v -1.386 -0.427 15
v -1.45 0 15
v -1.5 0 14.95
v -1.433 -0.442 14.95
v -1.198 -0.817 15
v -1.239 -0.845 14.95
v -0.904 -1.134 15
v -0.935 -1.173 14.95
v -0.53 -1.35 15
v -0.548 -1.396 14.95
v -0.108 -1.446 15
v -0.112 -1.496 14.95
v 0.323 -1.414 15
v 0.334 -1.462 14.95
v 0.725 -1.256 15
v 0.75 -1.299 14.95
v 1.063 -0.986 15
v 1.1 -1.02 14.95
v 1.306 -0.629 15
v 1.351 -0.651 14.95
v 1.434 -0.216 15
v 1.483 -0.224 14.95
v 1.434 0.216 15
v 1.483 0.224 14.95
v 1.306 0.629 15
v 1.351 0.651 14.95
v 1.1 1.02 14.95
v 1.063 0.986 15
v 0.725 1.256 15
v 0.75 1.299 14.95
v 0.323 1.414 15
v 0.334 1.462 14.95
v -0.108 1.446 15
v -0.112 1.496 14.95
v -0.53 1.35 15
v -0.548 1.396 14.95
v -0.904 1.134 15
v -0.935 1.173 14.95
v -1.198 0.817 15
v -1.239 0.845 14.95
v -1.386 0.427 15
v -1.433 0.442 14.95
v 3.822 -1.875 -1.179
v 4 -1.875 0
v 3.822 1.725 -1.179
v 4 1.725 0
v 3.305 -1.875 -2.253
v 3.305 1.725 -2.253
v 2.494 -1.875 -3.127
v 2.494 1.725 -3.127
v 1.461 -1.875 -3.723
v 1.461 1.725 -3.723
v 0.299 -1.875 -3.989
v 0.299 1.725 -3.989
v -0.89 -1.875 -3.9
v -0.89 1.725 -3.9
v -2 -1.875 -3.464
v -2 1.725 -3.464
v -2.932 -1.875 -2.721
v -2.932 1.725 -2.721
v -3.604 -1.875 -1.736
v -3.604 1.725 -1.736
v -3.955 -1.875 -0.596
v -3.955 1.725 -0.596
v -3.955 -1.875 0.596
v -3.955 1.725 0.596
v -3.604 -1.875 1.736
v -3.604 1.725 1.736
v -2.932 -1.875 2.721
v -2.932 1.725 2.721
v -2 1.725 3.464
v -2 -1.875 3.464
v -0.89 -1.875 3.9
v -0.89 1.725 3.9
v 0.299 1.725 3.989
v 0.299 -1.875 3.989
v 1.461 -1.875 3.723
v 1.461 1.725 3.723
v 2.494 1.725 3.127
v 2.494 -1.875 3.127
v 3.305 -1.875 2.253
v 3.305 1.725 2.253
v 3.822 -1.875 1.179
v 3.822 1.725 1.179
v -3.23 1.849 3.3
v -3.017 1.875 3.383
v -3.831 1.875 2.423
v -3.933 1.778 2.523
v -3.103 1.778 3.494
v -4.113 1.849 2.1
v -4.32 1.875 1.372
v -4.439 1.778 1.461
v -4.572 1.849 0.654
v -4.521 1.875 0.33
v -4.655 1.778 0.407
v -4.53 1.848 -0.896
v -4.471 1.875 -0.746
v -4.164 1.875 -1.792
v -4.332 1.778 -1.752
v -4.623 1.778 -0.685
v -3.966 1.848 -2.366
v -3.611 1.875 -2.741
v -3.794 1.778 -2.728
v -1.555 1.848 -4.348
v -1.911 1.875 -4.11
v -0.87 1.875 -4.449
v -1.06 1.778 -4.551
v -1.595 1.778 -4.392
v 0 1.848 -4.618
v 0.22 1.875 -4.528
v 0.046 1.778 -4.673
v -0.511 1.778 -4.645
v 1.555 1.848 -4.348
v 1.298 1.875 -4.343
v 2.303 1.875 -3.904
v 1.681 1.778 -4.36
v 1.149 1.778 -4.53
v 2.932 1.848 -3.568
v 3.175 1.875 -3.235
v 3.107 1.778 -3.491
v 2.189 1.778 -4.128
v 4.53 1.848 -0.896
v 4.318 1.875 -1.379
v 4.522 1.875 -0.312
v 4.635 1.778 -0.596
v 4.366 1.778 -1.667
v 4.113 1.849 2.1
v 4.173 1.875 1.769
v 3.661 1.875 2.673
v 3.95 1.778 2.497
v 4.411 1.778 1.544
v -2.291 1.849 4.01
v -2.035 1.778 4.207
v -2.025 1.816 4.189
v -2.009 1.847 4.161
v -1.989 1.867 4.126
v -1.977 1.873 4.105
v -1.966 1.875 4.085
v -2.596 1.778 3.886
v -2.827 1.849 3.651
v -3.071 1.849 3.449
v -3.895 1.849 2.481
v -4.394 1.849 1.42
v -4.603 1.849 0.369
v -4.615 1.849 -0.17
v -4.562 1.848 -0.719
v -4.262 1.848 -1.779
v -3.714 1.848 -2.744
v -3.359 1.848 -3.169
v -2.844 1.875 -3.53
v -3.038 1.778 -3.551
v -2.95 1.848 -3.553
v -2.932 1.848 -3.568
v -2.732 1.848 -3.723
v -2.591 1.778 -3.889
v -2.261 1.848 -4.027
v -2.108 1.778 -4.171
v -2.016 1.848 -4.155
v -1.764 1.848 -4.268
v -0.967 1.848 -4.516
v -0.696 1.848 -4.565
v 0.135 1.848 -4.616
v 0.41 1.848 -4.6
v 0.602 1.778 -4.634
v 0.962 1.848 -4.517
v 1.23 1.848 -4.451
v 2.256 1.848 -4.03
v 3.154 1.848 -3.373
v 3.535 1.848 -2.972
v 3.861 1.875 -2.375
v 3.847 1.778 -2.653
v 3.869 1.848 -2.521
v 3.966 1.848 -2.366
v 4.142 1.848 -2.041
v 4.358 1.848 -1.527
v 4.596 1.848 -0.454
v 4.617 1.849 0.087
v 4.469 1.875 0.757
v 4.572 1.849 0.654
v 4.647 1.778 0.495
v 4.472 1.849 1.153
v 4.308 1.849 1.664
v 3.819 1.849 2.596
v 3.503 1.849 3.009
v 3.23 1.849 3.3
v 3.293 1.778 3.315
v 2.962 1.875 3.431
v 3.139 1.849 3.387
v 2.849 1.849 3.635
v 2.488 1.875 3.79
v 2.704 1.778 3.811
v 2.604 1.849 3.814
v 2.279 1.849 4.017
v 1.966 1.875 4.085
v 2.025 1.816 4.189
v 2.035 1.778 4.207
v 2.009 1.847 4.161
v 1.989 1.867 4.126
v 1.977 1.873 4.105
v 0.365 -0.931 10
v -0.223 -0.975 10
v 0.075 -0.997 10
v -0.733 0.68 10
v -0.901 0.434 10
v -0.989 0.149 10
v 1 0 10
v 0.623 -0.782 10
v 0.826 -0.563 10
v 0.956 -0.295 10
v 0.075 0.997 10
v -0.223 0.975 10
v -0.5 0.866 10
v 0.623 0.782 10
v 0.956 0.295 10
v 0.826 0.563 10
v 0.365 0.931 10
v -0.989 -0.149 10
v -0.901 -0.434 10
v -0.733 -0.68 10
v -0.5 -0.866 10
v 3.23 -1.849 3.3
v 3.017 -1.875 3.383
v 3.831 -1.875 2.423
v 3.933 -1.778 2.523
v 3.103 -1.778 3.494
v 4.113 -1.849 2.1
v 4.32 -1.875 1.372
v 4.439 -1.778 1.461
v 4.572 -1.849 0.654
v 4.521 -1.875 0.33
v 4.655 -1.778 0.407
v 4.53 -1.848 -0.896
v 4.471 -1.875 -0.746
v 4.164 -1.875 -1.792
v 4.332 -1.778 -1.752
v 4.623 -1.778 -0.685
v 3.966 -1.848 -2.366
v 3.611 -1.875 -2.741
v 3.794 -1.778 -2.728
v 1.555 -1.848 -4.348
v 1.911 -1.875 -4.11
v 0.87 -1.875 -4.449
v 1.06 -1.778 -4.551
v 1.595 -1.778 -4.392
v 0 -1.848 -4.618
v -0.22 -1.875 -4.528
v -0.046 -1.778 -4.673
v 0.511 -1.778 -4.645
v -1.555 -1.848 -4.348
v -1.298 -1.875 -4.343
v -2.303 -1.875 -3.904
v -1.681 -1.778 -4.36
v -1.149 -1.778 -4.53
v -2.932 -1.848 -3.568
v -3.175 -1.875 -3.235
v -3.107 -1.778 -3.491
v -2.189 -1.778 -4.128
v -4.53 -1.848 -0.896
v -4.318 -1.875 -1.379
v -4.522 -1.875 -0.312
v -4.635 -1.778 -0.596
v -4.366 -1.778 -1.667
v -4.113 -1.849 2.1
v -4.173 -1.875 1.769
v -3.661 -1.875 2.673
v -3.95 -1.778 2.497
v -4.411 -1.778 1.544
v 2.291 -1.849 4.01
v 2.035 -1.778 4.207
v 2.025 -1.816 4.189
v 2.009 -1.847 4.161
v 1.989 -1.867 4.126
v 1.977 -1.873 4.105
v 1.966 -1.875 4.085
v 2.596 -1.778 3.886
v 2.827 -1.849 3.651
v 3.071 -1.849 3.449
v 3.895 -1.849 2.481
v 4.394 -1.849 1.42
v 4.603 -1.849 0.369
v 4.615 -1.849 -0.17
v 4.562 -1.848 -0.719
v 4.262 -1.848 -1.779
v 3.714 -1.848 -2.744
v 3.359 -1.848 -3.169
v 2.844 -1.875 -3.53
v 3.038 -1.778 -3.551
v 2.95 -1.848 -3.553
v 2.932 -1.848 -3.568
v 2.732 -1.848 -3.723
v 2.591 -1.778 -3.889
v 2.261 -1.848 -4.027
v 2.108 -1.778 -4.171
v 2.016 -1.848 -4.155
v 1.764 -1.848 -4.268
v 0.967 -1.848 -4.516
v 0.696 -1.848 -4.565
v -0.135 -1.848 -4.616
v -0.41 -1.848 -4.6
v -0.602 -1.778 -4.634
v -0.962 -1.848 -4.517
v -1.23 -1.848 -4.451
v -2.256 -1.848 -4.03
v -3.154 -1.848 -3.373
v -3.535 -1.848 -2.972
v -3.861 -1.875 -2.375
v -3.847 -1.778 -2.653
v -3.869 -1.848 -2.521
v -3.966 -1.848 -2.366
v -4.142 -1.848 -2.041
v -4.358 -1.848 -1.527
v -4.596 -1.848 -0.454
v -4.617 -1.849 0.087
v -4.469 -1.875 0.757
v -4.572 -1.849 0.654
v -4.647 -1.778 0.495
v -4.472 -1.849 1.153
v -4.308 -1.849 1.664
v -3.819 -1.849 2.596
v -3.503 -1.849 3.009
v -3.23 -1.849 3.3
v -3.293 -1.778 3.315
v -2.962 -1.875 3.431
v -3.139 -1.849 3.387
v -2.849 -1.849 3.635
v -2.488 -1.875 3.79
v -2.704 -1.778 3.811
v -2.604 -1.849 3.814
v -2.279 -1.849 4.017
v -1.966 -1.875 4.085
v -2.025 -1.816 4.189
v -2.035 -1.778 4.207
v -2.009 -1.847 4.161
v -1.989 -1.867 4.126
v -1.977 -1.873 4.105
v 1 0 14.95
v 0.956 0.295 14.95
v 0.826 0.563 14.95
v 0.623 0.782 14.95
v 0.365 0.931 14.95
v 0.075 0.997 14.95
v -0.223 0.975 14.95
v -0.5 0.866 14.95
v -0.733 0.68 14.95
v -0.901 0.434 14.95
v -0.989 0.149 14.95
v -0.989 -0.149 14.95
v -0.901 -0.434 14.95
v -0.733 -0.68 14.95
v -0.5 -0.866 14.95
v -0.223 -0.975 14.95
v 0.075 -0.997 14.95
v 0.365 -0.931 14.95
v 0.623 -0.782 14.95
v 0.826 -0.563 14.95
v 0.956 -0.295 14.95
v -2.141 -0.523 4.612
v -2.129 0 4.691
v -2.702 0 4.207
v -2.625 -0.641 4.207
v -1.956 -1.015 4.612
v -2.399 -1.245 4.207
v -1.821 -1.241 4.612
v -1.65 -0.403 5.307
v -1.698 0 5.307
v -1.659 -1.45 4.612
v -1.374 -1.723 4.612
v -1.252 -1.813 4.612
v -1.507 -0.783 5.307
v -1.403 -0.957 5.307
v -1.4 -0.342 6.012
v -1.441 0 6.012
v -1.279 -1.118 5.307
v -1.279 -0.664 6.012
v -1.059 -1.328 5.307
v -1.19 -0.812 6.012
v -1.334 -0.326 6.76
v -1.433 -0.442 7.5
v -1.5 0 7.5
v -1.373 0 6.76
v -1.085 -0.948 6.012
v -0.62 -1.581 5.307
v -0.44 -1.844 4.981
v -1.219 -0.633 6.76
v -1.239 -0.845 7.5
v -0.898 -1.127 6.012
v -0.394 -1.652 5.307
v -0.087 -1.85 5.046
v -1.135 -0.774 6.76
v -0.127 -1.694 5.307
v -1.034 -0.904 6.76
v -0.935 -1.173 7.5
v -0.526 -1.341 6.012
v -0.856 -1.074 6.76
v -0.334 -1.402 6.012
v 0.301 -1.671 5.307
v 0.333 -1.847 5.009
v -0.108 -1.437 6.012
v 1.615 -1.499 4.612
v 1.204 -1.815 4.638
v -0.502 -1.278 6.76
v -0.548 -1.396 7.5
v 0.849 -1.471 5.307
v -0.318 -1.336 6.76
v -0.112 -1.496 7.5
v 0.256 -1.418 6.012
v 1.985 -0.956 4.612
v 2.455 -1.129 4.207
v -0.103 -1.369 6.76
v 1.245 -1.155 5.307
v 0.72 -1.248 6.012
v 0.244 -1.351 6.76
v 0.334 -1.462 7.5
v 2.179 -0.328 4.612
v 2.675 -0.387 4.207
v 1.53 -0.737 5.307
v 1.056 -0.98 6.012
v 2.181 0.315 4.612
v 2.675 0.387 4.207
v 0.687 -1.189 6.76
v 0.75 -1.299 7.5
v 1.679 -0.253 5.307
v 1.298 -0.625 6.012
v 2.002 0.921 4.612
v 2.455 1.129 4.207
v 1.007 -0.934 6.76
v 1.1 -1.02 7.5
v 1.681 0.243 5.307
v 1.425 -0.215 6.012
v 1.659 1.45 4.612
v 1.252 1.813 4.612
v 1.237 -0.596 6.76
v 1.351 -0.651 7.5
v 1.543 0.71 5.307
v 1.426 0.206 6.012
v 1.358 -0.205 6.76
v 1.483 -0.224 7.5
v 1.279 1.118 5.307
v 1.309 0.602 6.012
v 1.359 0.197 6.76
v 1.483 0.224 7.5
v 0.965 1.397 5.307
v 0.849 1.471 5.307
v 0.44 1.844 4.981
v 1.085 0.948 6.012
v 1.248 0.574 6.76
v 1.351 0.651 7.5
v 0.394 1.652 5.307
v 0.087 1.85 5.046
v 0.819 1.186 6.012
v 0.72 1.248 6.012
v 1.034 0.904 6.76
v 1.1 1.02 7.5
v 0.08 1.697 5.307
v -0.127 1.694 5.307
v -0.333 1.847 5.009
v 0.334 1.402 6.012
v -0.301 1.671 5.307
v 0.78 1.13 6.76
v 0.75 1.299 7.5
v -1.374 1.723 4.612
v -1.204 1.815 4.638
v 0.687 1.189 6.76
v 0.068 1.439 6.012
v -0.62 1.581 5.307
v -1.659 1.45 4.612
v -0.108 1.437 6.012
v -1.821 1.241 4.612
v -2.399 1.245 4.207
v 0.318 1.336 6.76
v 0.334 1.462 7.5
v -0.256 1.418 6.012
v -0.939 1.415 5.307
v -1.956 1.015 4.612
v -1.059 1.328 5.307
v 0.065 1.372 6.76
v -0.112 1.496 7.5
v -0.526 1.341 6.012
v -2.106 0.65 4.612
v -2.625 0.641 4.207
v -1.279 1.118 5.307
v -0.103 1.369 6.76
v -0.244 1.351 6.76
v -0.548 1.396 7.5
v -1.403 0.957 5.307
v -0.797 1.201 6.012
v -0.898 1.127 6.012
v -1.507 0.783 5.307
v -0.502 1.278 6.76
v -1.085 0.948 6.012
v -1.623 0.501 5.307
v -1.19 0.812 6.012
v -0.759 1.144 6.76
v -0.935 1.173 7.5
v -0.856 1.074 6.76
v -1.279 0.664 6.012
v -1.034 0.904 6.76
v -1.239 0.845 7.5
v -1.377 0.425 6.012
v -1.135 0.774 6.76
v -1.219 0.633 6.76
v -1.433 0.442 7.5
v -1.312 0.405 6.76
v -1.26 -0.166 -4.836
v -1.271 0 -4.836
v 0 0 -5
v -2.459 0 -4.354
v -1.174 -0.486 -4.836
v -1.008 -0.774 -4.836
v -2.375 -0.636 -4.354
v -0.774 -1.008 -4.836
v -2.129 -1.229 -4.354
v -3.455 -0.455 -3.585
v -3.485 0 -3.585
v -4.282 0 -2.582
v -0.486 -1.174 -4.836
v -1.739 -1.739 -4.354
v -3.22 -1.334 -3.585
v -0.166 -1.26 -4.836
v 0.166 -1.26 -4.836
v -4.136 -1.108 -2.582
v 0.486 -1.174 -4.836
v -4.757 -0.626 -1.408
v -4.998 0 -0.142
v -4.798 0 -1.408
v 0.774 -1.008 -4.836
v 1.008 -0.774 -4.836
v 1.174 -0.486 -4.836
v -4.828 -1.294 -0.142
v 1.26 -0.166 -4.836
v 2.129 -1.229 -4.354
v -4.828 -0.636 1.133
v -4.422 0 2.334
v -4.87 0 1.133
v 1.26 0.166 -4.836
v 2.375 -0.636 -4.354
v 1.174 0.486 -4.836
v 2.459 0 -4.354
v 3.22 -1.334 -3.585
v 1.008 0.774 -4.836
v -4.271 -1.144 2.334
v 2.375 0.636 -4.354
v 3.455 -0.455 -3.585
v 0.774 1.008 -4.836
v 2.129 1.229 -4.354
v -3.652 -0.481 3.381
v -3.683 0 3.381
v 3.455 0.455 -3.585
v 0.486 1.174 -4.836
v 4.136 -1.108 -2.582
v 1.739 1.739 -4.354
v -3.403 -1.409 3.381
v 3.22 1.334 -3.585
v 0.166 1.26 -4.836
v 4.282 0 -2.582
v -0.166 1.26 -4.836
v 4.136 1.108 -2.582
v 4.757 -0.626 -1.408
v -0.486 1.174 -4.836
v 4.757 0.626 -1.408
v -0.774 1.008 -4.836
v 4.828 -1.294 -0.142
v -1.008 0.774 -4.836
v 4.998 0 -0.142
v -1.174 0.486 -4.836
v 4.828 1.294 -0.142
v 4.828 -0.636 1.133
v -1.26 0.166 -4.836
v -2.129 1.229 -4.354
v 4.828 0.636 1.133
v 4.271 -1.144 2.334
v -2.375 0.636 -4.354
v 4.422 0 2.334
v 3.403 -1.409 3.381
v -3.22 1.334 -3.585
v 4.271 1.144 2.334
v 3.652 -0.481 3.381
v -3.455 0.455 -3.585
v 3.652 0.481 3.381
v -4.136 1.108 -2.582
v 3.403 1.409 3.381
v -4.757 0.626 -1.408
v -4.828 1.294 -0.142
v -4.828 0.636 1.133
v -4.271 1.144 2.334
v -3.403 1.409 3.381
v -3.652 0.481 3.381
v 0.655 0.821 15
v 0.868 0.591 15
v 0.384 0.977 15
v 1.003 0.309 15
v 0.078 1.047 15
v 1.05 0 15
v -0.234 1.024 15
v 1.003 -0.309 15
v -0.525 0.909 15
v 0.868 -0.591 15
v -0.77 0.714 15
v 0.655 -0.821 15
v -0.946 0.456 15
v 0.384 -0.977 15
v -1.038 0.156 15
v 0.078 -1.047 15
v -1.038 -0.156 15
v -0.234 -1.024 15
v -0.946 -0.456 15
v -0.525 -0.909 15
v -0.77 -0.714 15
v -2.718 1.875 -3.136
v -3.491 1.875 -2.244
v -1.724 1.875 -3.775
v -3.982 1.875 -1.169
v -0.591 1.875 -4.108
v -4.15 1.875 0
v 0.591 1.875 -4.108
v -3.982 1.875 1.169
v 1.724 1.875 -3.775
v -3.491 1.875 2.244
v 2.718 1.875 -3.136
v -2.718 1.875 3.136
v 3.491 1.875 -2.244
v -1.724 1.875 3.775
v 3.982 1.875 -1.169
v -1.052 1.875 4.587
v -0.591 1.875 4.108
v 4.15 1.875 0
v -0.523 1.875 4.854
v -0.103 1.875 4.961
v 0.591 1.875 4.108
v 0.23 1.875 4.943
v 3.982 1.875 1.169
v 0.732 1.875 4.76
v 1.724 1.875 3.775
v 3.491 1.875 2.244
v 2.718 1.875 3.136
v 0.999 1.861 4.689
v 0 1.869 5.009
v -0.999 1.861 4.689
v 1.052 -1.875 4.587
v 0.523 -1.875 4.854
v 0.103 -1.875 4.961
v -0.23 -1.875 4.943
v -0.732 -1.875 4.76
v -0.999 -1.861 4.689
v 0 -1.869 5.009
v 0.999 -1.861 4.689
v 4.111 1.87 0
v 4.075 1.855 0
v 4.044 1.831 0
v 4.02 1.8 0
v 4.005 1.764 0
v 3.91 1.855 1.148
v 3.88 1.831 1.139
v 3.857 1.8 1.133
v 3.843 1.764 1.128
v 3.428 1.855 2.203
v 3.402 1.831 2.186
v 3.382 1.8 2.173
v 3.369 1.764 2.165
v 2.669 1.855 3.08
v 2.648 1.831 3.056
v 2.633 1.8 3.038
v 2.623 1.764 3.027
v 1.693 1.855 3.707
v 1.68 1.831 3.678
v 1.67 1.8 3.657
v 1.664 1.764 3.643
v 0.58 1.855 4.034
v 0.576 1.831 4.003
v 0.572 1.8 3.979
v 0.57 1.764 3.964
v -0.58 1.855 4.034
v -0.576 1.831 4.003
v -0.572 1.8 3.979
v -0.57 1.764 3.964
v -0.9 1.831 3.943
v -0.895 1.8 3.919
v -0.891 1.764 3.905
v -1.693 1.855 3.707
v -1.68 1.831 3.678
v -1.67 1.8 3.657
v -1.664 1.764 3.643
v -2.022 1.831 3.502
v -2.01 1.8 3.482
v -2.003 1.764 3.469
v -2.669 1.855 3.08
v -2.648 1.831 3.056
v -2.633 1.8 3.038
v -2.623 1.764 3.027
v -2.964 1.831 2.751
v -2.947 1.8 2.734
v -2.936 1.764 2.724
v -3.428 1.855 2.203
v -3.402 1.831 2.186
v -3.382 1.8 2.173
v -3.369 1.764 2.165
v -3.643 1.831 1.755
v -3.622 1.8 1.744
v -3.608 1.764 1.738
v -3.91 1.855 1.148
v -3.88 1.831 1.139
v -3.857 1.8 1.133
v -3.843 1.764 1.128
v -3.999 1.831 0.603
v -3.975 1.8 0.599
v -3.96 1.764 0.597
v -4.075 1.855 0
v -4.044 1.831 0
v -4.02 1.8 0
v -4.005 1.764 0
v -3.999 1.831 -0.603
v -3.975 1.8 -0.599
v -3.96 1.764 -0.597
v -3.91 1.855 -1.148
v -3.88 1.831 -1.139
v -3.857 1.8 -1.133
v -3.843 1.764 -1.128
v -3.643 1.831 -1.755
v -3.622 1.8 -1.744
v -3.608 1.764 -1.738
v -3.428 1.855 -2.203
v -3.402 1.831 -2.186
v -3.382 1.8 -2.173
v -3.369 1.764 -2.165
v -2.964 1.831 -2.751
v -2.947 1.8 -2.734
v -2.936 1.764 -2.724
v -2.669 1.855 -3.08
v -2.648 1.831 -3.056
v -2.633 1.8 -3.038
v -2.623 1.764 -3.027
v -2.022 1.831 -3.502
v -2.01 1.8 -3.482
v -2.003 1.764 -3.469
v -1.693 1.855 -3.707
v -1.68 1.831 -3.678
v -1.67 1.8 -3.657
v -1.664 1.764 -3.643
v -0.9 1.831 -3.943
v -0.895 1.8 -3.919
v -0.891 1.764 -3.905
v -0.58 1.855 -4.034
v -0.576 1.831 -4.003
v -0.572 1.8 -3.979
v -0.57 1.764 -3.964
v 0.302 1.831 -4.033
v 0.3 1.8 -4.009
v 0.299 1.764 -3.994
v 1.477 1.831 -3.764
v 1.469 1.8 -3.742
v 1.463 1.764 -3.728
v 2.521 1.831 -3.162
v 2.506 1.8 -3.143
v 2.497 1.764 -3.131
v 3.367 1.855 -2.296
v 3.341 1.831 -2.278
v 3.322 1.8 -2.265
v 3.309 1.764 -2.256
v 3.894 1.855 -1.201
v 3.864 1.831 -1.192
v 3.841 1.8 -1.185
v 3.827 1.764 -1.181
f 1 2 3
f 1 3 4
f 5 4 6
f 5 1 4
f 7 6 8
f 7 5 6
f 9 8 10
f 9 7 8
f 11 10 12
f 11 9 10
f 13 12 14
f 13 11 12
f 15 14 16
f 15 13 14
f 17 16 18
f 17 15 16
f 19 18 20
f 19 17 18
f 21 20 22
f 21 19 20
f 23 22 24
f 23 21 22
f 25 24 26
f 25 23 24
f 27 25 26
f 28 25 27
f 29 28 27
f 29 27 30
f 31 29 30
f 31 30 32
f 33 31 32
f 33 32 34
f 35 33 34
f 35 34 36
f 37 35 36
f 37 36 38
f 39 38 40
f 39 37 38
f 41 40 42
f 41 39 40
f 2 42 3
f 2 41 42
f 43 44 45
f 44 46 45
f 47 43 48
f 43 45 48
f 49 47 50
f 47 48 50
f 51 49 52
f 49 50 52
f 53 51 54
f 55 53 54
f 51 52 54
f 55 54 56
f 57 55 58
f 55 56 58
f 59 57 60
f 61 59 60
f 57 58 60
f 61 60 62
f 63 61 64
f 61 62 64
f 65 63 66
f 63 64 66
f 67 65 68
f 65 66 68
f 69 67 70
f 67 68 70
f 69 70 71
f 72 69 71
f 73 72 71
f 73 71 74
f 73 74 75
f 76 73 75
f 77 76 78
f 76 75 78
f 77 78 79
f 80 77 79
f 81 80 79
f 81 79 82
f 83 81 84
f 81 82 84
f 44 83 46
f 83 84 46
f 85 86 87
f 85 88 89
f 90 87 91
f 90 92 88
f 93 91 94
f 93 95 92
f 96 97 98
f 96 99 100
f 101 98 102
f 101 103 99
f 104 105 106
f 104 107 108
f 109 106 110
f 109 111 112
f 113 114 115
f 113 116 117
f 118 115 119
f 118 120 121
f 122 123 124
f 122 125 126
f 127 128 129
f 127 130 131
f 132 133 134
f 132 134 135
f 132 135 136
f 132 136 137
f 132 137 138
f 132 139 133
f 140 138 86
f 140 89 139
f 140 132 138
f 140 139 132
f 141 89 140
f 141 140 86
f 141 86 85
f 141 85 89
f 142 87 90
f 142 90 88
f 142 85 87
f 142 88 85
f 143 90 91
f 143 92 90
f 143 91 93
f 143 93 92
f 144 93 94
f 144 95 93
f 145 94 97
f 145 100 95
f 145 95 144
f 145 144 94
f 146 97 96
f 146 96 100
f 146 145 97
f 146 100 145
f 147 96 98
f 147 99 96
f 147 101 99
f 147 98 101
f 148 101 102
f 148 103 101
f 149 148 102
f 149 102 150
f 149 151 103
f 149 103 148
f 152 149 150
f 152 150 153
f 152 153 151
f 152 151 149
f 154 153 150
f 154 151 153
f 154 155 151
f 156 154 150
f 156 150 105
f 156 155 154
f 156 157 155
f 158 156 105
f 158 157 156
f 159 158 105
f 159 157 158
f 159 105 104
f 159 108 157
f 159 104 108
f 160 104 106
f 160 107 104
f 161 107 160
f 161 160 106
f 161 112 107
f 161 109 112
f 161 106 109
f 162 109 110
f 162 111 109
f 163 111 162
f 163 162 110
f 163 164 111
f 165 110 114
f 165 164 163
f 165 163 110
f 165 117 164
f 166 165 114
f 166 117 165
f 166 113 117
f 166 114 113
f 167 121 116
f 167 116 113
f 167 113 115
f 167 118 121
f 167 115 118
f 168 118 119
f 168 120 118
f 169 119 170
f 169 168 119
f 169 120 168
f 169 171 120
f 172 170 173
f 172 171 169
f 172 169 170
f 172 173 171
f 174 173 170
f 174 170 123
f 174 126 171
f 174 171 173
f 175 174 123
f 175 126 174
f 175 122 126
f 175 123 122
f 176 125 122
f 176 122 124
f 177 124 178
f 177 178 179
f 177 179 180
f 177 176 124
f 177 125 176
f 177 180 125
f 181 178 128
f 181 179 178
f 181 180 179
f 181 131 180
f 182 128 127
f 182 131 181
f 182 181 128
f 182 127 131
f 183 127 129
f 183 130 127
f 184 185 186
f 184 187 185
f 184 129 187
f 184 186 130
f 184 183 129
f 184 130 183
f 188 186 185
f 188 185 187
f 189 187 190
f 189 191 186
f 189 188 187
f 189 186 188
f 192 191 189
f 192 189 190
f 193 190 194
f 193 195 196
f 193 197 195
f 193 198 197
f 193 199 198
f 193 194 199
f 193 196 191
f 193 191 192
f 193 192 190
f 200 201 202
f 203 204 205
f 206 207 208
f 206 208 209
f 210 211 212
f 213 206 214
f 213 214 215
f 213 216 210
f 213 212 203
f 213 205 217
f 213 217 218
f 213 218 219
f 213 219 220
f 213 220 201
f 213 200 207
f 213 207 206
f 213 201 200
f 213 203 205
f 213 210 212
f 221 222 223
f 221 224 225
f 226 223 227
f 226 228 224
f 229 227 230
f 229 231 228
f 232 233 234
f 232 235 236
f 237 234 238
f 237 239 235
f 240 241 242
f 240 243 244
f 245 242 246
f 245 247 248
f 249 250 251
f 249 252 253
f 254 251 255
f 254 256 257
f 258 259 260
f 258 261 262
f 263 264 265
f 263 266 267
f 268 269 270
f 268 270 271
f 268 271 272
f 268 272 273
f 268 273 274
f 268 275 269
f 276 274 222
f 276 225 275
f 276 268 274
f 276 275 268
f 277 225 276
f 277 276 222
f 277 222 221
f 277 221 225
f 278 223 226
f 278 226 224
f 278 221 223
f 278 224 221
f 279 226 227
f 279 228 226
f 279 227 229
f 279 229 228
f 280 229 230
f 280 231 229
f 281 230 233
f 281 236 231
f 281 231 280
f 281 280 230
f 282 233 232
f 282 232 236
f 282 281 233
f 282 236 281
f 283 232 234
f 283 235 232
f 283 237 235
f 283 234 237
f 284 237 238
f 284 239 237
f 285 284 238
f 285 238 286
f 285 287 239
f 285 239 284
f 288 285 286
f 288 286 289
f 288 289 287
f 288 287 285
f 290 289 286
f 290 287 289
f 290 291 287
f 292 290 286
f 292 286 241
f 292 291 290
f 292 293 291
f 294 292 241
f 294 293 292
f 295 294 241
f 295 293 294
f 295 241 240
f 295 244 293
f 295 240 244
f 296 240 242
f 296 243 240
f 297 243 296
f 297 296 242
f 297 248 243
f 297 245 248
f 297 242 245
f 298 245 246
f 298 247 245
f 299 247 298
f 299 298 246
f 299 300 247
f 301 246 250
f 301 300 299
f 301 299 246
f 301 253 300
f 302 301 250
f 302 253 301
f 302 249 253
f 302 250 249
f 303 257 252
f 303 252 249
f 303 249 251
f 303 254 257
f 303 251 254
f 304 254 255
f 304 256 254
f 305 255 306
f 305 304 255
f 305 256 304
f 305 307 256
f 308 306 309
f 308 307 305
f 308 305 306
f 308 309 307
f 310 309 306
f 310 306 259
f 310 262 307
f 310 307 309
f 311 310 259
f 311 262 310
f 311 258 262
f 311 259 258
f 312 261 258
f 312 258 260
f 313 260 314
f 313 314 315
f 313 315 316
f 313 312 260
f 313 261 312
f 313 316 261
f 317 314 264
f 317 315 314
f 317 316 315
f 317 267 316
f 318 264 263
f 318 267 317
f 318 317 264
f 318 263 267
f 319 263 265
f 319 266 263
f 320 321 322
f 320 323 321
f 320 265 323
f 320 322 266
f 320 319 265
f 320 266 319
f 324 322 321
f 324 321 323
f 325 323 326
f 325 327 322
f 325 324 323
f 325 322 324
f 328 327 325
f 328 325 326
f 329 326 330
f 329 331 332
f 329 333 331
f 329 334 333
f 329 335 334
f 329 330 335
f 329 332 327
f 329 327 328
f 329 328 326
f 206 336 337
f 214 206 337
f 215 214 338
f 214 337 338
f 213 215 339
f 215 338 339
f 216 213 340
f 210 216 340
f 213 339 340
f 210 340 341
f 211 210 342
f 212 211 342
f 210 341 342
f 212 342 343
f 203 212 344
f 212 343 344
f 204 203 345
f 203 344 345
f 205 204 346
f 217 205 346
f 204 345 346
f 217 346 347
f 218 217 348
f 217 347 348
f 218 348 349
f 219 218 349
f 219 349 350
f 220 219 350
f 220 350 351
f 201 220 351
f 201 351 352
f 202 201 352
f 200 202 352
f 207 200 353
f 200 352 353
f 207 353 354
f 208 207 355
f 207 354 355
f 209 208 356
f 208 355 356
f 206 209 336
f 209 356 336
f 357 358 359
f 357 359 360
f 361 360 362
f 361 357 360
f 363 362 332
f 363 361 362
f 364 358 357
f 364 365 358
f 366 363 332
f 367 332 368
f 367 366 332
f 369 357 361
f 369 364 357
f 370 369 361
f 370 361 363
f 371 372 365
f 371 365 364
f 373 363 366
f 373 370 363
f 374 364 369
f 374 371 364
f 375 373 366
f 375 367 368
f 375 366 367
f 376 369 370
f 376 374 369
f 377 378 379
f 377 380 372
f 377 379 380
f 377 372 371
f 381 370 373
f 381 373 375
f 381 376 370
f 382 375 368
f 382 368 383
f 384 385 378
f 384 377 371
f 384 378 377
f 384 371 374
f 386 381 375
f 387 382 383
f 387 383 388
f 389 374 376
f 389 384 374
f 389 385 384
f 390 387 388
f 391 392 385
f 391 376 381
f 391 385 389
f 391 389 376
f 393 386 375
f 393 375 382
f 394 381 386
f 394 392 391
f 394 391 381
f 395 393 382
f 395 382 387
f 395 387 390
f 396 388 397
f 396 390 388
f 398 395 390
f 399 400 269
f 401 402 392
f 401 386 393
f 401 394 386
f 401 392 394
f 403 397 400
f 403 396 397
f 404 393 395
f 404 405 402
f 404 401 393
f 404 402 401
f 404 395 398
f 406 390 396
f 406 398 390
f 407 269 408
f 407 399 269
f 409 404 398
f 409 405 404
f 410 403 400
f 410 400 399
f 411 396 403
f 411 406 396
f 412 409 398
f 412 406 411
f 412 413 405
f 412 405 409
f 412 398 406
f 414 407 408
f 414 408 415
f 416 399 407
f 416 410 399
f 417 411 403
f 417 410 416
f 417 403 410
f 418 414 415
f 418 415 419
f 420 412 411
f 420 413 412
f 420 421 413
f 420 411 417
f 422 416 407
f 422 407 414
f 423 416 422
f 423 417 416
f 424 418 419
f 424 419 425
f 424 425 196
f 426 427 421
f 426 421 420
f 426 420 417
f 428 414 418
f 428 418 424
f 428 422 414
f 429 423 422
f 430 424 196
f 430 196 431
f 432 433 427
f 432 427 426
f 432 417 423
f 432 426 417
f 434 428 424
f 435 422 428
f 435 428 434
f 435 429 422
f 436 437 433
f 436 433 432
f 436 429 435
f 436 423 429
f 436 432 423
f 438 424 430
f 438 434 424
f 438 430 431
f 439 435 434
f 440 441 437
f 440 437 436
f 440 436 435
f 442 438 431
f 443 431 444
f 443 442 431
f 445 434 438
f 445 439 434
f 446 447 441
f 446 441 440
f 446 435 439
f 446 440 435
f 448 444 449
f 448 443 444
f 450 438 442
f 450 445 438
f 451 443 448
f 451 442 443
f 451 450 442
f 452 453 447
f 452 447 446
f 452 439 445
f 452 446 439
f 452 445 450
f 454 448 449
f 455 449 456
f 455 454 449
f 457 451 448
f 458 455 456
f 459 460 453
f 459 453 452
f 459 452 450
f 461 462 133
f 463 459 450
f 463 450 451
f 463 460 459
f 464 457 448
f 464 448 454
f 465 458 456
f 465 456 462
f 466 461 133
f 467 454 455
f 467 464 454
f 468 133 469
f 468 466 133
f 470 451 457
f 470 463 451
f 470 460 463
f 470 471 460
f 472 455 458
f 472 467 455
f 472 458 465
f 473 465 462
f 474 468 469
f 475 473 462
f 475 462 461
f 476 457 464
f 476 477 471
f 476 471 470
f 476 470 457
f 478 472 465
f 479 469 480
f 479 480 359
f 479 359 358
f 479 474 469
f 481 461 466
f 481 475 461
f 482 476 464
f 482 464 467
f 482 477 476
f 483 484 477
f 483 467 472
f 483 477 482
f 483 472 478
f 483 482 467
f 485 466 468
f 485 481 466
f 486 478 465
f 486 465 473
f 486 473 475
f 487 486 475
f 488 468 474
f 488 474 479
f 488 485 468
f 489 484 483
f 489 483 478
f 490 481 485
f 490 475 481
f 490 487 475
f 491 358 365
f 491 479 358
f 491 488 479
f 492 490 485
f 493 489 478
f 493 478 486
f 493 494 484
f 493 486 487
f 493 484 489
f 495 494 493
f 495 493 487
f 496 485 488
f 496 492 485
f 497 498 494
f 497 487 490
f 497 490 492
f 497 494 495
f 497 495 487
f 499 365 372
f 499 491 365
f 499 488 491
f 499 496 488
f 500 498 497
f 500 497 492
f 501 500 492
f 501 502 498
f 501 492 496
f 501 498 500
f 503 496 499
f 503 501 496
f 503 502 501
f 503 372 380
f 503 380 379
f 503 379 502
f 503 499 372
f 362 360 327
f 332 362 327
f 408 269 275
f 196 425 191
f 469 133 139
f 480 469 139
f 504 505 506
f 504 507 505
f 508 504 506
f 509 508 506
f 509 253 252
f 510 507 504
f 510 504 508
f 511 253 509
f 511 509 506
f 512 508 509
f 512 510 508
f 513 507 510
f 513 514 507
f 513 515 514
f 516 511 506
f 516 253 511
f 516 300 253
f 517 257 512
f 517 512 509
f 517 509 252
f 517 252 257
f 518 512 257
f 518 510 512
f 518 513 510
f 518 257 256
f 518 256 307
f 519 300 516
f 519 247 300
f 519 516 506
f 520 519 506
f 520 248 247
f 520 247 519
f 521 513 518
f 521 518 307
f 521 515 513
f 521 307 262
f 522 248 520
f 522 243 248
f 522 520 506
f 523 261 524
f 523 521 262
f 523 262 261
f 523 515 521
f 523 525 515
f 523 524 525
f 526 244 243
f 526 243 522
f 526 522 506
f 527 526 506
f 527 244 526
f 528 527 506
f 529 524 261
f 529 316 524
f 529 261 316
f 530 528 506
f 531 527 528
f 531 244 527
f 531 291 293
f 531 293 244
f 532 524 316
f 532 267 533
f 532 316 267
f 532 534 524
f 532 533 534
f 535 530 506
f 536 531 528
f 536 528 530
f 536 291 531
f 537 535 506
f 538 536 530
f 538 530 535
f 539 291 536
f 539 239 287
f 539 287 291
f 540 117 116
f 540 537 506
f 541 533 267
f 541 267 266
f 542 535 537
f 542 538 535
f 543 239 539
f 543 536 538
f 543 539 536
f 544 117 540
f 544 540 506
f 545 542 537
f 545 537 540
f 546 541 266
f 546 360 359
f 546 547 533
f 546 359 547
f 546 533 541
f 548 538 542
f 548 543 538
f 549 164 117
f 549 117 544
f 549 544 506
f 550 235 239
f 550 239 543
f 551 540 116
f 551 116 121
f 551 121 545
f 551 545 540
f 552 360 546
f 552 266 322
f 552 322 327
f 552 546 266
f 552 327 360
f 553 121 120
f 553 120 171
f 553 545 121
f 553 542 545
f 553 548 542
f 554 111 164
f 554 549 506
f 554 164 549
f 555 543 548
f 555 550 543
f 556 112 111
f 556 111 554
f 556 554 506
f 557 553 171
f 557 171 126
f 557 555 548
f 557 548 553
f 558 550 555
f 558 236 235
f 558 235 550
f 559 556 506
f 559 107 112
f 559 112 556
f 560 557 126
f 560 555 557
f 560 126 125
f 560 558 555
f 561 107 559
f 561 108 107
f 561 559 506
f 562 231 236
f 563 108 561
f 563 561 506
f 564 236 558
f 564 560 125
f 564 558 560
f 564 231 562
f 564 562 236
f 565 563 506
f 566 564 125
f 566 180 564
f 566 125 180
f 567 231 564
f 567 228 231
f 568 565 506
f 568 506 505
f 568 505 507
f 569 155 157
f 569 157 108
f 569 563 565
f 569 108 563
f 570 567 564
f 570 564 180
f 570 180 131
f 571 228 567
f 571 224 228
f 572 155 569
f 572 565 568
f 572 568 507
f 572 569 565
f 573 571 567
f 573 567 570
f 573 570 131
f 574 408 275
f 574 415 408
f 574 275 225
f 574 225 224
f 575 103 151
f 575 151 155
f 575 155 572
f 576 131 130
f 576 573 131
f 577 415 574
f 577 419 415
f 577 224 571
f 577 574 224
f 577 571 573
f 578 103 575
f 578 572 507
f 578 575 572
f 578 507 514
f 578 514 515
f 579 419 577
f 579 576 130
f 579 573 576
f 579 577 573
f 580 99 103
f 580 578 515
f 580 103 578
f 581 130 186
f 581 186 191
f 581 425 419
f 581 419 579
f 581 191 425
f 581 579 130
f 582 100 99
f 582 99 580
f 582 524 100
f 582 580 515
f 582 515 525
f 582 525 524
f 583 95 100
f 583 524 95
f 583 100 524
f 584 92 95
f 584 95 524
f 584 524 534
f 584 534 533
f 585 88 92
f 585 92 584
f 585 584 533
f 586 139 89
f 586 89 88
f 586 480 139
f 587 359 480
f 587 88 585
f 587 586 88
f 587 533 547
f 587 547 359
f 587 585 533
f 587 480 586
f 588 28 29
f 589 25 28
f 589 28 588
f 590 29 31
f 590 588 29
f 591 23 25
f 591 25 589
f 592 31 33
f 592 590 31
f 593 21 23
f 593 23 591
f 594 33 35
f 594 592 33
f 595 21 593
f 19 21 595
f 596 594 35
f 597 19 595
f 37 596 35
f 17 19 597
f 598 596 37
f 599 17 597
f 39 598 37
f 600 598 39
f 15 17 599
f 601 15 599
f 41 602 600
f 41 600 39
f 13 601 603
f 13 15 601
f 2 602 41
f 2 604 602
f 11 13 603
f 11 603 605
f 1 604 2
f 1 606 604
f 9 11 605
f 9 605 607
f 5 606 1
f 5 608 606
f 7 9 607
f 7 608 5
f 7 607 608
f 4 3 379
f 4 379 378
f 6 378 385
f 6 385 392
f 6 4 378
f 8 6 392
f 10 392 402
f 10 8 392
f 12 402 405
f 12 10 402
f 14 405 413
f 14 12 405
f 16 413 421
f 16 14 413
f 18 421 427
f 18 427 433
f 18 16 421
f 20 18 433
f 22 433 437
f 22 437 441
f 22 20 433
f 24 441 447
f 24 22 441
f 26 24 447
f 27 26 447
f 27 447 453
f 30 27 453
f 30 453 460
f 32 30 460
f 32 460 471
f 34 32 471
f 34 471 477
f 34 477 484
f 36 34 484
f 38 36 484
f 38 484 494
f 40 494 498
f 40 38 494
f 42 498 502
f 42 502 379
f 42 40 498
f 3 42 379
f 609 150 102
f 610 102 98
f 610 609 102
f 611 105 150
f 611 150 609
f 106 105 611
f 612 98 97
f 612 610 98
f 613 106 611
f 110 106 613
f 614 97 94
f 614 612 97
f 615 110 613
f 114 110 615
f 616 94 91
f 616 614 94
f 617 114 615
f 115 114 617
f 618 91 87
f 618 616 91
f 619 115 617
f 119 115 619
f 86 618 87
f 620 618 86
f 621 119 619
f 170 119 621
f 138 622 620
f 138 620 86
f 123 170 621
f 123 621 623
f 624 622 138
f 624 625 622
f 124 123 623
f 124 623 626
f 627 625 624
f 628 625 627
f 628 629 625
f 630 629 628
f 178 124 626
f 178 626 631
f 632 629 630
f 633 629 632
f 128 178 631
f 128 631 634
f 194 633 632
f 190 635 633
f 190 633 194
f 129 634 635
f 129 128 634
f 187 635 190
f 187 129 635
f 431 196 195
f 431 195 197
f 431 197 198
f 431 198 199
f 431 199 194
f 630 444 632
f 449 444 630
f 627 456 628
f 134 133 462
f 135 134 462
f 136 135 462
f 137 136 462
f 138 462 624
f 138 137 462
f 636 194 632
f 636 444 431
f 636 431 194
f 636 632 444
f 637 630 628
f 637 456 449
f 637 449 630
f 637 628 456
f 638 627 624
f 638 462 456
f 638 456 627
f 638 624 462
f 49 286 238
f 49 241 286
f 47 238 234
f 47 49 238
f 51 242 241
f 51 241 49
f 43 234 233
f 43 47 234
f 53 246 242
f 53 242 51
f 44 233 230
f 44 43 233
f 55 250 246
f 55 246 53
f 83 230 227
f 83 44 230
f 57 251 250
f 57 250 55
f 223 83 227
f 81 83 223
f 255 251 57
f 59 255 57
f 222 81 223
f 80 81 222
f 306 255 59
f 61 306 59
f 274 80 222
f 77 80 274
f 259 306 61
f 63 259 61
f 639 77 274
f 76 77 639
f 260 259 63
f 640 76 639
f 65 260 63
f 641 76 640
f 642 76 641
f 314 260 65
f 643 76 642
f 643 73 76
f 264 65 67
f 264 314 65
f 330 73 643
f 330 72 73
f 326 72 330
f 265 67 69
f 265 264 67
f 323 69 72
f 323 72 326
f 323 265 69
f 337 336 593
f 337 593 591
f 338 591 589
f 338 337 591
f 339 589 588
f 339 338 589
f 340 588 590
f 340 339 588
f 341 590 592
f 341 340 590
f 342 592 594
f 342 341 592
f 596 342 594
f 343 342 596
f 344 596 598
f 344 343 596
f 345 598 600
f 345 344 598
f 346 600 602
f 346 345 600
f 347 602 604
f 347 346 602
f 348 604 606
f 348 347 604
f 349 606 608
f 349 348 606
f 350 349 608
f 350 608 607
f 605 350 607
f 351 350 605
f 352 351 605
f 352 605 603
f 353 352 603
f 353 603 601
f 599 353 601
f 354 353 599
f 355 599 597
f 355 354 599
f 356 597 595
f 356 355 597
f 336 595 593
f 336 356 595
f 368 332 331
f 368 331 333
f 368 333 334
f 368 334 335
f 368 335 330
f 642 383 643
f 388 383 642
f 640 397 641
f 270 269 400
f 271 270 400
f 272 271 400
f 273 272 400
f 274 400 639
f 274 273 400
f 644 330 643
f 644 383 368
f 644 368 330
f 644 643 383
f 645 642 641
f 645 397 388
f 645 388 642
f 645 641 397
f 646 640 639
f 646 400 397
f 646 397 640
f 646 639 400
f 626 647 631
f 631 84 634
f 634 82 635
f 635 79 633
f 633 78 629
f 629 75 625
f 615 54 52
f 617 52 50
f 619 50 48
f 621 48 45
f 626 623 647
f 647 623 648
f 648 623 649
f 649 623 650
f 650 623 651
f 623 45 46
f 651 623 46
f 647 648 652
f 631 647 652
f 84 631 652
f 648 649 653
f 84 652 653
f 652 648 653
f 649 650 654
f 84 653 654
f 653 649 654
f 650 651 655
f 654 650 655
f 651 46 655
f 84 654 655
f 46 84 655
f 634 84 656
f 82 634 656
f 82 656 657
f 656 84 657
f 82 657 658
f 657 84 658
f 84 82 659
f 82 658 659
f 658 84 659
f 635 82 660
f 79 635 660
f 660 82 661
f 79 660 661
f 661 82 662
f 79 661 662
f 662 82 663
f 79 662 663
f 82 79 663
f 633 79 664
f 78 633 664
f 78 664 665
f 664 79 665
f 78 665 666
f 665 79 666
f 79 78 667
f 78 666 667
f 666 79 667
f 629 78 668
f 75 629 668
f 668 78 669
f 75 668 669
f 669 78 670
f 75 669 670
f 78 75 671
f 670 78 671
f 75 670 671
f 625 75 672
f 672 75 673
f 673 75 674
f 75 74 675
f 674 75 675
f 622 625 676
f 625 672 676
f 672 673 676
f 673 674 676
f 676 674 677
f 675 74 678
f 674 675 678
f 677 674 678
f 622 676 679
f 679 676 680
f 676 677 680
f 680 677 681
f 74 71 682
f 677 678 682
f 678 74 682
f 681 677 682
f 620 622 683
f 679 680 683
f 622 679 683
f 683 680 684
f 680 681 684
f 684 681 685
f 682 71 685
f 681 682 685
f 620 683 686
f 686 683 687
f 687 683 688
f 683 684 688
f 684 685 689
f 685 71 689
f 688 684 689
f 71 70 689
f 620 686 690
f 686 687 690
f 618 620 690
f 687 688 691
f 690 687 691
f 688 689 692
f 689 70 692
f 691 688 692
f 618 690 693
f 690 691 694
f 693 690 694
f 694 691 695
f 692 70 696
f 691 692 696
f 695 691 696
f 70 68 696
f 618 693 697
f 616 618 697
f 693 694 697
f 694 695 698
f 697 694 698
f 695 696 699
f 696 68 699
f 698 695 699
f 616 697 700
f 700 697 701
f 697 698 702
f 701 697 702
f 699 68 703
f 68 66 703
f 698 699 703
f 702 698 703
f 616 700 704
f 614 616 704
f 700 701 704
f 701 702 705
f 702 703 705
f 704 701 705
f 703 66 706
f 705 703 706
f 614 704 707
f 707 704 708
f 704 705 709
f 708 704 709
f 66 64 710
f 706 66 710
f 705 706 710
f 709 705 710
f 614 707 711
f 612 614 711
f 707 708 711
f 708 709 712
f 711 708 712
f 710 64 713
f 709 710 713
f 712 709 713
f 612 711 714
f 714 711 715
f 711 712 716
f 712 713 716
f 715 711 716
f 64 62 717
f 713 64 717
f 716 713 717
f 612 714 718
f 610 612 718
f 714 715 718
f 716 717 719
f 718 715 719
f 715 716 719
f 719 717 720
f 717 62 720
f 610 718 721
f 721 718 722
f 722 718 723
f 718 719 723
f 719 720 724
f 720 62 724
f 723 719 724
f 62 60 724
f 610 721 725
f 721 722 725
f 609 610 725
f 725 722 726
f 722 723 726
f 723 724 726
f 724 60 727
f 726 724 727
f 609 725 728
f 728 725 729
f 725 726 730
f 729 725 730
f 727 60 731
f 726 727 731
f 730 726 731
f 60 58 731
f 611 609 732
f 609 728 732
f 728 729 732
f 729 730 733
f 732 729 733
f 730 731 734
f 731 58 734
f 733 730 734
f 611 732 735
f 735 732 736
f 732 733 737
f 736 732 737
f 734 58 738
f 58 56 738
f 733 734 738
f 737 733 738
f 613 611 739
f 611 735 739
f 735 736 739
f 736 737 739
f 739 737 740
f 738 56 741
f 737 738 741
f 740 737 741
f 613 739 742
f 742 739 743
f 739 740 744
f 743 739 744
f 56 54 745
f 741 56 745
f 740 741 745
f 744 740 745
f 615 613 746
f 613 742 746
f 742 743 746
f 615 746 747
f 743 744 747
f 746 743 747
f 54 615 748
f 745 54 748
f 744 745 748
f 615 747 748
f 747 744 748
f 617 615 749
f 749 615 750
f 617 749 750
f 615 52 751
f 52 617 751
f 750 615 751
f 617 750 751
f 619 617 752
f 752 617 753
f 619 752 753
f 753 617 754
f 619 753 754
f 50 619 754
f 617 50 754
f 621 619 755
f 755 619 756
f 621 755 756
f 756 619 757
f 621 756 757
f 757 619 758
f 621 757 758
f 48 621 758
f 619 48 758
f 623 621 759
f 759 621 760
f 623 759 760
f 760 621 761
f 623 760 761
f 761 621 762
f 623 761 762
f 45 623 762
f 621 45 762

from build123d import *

# Parameters (mm, degrees)
CUT_EXTRUDE1_DEPTH      = 10
CUT_EXTRUDE1_DEPTH_BACK = 10
SKETCH4_R               = 4
CUT_EXTRUDE2_DEPTH      = 10
CUT_EXTRUDE2_DEPTH_BACK = 10
FILLET1_R               = 0.15
SKETCH5_R               = 1
CUT_EXTRUDE3_DEPTH      = 5
CHAMFER1_SIZE           = 0.05


with BuildPart() as part:
    # Sketch2 → Revolve1 (revolve)
    with BuildSketch(Plane(origin=(0, 0, 0), x_dir=(1, 0, 0), z_dir=(0, 1, 0))):
        with BuildLine():
            Line((-1.5, -15), (0, -15))
            Line((0, -15), (0, 5))
            ThreePointArc((0, 5), (-4.79758973, 1.408237475), (-2.702458258, -4.206746886))
            ThreePointArc((-2.702458258, -4.206746886), (-1.546688632, -5.650895292), (-1.5, -7.5))
            Line((-1.5, -7.5), (-1.5, -15))
        make_face()
    revolve(axis=Axis((0, 0, -5), (0, 0, 1)))

    # Sketch3 → Cut-Extrude1 (cut, two sides)
    with BuildSketch(Plane(origin=(0, 0, 0), x_dir=(0, 0, -1), z_dir=(1, 0, 0))) as cut_extrude1_sk:
        with BuildLine():
            Line((-17.836706107, 9.431664346), (9.515900439, 9.431664346))
            Line((9.515900439, 9.431664346), (9.515900439, 1.875))
            Line((9.515900439, 1.875), (-5.468177039, 1.875))
            ThreePointArc((-5.468177039, 1.875), (-6.971706036, 2.106415246), (-8.336059221, 2.779239779))
            Line((-8.336059221, 2.779239779), (-17.836706107, 9.431664346))
        make_face()
        with BuildLine():
            Line((9.515900439, -1.875), (-5.468177039, -1.875))
            ThreePointArc((-5.468177039, -1.875), (-6.971706036, -2.106415246), (-8.336059221, -2.779239779))
            Line((-8.336059221, -2.779239779), (-17.836706107, -9.431664346))
            Line((-17.836706107, -9.431664346), (9.515900439, -9.431664346))
            Line((9.515900439, -9.431664346), (9.515900439, -1.875))
        make_face()
    extrude(amount=CUT_EXTRUDE1_DEPTH, mode=Mode.SUBTRACT)
    extrude(cut_extrude1_sk.sketch, amount=-CUT_EXTRUDE1_DEPTH_BACK, mode=Mode.SUBTRACT)

    # Sketch4 → Cut-Extrude2 (cut, two sides)
    with BuildSketch(Plane(origin=(0, 0, 0), x_dir=(1, 0, 0), z_dir=(0, 1, 0))) as cut_extrude2_sk:
        Circle(SKETCH4_R)
    extrude(amount=CUT_EXTRUDE2_DEPTH, mode=Mode.SUBTRACT)
    extrude(cut_extrude2_sk.sketch, amount=-CUT_EXTRUDE2_DEPTH_BACK, mode=Mode.SUBTRACT)

    # Fillet1
    fillet1_edges = [part.edges().sort_by_distance(p)[0] for p in [
        (0, 1.875, -4.635124054),
        (0, -1.875, -4.635124054),
        (-4, 1.875, 0),
    ]]
    fillet(fillet1_edges, radius=FILLET1_R)

    # Sketch5 → Cut-Extrude3 (cut)
    with BuildSketch(Plane.XY.offset(15)):
        Circle(SKETCH5_R)
    extrude(amount=-CUT_EXTRUDE3_DEPTH, mode=Mode.SUBTRACT)

    # Chamfer1
    chamfer1_edges = [part.edges().sort_by_distance(p)[0] for p in [
        (1.5, 0, 15),
        (-1, 0, 15),
    ]]
    chamfer(chamfer1_edges, length=CHAMFER1_SIZE)


solid = part.part
